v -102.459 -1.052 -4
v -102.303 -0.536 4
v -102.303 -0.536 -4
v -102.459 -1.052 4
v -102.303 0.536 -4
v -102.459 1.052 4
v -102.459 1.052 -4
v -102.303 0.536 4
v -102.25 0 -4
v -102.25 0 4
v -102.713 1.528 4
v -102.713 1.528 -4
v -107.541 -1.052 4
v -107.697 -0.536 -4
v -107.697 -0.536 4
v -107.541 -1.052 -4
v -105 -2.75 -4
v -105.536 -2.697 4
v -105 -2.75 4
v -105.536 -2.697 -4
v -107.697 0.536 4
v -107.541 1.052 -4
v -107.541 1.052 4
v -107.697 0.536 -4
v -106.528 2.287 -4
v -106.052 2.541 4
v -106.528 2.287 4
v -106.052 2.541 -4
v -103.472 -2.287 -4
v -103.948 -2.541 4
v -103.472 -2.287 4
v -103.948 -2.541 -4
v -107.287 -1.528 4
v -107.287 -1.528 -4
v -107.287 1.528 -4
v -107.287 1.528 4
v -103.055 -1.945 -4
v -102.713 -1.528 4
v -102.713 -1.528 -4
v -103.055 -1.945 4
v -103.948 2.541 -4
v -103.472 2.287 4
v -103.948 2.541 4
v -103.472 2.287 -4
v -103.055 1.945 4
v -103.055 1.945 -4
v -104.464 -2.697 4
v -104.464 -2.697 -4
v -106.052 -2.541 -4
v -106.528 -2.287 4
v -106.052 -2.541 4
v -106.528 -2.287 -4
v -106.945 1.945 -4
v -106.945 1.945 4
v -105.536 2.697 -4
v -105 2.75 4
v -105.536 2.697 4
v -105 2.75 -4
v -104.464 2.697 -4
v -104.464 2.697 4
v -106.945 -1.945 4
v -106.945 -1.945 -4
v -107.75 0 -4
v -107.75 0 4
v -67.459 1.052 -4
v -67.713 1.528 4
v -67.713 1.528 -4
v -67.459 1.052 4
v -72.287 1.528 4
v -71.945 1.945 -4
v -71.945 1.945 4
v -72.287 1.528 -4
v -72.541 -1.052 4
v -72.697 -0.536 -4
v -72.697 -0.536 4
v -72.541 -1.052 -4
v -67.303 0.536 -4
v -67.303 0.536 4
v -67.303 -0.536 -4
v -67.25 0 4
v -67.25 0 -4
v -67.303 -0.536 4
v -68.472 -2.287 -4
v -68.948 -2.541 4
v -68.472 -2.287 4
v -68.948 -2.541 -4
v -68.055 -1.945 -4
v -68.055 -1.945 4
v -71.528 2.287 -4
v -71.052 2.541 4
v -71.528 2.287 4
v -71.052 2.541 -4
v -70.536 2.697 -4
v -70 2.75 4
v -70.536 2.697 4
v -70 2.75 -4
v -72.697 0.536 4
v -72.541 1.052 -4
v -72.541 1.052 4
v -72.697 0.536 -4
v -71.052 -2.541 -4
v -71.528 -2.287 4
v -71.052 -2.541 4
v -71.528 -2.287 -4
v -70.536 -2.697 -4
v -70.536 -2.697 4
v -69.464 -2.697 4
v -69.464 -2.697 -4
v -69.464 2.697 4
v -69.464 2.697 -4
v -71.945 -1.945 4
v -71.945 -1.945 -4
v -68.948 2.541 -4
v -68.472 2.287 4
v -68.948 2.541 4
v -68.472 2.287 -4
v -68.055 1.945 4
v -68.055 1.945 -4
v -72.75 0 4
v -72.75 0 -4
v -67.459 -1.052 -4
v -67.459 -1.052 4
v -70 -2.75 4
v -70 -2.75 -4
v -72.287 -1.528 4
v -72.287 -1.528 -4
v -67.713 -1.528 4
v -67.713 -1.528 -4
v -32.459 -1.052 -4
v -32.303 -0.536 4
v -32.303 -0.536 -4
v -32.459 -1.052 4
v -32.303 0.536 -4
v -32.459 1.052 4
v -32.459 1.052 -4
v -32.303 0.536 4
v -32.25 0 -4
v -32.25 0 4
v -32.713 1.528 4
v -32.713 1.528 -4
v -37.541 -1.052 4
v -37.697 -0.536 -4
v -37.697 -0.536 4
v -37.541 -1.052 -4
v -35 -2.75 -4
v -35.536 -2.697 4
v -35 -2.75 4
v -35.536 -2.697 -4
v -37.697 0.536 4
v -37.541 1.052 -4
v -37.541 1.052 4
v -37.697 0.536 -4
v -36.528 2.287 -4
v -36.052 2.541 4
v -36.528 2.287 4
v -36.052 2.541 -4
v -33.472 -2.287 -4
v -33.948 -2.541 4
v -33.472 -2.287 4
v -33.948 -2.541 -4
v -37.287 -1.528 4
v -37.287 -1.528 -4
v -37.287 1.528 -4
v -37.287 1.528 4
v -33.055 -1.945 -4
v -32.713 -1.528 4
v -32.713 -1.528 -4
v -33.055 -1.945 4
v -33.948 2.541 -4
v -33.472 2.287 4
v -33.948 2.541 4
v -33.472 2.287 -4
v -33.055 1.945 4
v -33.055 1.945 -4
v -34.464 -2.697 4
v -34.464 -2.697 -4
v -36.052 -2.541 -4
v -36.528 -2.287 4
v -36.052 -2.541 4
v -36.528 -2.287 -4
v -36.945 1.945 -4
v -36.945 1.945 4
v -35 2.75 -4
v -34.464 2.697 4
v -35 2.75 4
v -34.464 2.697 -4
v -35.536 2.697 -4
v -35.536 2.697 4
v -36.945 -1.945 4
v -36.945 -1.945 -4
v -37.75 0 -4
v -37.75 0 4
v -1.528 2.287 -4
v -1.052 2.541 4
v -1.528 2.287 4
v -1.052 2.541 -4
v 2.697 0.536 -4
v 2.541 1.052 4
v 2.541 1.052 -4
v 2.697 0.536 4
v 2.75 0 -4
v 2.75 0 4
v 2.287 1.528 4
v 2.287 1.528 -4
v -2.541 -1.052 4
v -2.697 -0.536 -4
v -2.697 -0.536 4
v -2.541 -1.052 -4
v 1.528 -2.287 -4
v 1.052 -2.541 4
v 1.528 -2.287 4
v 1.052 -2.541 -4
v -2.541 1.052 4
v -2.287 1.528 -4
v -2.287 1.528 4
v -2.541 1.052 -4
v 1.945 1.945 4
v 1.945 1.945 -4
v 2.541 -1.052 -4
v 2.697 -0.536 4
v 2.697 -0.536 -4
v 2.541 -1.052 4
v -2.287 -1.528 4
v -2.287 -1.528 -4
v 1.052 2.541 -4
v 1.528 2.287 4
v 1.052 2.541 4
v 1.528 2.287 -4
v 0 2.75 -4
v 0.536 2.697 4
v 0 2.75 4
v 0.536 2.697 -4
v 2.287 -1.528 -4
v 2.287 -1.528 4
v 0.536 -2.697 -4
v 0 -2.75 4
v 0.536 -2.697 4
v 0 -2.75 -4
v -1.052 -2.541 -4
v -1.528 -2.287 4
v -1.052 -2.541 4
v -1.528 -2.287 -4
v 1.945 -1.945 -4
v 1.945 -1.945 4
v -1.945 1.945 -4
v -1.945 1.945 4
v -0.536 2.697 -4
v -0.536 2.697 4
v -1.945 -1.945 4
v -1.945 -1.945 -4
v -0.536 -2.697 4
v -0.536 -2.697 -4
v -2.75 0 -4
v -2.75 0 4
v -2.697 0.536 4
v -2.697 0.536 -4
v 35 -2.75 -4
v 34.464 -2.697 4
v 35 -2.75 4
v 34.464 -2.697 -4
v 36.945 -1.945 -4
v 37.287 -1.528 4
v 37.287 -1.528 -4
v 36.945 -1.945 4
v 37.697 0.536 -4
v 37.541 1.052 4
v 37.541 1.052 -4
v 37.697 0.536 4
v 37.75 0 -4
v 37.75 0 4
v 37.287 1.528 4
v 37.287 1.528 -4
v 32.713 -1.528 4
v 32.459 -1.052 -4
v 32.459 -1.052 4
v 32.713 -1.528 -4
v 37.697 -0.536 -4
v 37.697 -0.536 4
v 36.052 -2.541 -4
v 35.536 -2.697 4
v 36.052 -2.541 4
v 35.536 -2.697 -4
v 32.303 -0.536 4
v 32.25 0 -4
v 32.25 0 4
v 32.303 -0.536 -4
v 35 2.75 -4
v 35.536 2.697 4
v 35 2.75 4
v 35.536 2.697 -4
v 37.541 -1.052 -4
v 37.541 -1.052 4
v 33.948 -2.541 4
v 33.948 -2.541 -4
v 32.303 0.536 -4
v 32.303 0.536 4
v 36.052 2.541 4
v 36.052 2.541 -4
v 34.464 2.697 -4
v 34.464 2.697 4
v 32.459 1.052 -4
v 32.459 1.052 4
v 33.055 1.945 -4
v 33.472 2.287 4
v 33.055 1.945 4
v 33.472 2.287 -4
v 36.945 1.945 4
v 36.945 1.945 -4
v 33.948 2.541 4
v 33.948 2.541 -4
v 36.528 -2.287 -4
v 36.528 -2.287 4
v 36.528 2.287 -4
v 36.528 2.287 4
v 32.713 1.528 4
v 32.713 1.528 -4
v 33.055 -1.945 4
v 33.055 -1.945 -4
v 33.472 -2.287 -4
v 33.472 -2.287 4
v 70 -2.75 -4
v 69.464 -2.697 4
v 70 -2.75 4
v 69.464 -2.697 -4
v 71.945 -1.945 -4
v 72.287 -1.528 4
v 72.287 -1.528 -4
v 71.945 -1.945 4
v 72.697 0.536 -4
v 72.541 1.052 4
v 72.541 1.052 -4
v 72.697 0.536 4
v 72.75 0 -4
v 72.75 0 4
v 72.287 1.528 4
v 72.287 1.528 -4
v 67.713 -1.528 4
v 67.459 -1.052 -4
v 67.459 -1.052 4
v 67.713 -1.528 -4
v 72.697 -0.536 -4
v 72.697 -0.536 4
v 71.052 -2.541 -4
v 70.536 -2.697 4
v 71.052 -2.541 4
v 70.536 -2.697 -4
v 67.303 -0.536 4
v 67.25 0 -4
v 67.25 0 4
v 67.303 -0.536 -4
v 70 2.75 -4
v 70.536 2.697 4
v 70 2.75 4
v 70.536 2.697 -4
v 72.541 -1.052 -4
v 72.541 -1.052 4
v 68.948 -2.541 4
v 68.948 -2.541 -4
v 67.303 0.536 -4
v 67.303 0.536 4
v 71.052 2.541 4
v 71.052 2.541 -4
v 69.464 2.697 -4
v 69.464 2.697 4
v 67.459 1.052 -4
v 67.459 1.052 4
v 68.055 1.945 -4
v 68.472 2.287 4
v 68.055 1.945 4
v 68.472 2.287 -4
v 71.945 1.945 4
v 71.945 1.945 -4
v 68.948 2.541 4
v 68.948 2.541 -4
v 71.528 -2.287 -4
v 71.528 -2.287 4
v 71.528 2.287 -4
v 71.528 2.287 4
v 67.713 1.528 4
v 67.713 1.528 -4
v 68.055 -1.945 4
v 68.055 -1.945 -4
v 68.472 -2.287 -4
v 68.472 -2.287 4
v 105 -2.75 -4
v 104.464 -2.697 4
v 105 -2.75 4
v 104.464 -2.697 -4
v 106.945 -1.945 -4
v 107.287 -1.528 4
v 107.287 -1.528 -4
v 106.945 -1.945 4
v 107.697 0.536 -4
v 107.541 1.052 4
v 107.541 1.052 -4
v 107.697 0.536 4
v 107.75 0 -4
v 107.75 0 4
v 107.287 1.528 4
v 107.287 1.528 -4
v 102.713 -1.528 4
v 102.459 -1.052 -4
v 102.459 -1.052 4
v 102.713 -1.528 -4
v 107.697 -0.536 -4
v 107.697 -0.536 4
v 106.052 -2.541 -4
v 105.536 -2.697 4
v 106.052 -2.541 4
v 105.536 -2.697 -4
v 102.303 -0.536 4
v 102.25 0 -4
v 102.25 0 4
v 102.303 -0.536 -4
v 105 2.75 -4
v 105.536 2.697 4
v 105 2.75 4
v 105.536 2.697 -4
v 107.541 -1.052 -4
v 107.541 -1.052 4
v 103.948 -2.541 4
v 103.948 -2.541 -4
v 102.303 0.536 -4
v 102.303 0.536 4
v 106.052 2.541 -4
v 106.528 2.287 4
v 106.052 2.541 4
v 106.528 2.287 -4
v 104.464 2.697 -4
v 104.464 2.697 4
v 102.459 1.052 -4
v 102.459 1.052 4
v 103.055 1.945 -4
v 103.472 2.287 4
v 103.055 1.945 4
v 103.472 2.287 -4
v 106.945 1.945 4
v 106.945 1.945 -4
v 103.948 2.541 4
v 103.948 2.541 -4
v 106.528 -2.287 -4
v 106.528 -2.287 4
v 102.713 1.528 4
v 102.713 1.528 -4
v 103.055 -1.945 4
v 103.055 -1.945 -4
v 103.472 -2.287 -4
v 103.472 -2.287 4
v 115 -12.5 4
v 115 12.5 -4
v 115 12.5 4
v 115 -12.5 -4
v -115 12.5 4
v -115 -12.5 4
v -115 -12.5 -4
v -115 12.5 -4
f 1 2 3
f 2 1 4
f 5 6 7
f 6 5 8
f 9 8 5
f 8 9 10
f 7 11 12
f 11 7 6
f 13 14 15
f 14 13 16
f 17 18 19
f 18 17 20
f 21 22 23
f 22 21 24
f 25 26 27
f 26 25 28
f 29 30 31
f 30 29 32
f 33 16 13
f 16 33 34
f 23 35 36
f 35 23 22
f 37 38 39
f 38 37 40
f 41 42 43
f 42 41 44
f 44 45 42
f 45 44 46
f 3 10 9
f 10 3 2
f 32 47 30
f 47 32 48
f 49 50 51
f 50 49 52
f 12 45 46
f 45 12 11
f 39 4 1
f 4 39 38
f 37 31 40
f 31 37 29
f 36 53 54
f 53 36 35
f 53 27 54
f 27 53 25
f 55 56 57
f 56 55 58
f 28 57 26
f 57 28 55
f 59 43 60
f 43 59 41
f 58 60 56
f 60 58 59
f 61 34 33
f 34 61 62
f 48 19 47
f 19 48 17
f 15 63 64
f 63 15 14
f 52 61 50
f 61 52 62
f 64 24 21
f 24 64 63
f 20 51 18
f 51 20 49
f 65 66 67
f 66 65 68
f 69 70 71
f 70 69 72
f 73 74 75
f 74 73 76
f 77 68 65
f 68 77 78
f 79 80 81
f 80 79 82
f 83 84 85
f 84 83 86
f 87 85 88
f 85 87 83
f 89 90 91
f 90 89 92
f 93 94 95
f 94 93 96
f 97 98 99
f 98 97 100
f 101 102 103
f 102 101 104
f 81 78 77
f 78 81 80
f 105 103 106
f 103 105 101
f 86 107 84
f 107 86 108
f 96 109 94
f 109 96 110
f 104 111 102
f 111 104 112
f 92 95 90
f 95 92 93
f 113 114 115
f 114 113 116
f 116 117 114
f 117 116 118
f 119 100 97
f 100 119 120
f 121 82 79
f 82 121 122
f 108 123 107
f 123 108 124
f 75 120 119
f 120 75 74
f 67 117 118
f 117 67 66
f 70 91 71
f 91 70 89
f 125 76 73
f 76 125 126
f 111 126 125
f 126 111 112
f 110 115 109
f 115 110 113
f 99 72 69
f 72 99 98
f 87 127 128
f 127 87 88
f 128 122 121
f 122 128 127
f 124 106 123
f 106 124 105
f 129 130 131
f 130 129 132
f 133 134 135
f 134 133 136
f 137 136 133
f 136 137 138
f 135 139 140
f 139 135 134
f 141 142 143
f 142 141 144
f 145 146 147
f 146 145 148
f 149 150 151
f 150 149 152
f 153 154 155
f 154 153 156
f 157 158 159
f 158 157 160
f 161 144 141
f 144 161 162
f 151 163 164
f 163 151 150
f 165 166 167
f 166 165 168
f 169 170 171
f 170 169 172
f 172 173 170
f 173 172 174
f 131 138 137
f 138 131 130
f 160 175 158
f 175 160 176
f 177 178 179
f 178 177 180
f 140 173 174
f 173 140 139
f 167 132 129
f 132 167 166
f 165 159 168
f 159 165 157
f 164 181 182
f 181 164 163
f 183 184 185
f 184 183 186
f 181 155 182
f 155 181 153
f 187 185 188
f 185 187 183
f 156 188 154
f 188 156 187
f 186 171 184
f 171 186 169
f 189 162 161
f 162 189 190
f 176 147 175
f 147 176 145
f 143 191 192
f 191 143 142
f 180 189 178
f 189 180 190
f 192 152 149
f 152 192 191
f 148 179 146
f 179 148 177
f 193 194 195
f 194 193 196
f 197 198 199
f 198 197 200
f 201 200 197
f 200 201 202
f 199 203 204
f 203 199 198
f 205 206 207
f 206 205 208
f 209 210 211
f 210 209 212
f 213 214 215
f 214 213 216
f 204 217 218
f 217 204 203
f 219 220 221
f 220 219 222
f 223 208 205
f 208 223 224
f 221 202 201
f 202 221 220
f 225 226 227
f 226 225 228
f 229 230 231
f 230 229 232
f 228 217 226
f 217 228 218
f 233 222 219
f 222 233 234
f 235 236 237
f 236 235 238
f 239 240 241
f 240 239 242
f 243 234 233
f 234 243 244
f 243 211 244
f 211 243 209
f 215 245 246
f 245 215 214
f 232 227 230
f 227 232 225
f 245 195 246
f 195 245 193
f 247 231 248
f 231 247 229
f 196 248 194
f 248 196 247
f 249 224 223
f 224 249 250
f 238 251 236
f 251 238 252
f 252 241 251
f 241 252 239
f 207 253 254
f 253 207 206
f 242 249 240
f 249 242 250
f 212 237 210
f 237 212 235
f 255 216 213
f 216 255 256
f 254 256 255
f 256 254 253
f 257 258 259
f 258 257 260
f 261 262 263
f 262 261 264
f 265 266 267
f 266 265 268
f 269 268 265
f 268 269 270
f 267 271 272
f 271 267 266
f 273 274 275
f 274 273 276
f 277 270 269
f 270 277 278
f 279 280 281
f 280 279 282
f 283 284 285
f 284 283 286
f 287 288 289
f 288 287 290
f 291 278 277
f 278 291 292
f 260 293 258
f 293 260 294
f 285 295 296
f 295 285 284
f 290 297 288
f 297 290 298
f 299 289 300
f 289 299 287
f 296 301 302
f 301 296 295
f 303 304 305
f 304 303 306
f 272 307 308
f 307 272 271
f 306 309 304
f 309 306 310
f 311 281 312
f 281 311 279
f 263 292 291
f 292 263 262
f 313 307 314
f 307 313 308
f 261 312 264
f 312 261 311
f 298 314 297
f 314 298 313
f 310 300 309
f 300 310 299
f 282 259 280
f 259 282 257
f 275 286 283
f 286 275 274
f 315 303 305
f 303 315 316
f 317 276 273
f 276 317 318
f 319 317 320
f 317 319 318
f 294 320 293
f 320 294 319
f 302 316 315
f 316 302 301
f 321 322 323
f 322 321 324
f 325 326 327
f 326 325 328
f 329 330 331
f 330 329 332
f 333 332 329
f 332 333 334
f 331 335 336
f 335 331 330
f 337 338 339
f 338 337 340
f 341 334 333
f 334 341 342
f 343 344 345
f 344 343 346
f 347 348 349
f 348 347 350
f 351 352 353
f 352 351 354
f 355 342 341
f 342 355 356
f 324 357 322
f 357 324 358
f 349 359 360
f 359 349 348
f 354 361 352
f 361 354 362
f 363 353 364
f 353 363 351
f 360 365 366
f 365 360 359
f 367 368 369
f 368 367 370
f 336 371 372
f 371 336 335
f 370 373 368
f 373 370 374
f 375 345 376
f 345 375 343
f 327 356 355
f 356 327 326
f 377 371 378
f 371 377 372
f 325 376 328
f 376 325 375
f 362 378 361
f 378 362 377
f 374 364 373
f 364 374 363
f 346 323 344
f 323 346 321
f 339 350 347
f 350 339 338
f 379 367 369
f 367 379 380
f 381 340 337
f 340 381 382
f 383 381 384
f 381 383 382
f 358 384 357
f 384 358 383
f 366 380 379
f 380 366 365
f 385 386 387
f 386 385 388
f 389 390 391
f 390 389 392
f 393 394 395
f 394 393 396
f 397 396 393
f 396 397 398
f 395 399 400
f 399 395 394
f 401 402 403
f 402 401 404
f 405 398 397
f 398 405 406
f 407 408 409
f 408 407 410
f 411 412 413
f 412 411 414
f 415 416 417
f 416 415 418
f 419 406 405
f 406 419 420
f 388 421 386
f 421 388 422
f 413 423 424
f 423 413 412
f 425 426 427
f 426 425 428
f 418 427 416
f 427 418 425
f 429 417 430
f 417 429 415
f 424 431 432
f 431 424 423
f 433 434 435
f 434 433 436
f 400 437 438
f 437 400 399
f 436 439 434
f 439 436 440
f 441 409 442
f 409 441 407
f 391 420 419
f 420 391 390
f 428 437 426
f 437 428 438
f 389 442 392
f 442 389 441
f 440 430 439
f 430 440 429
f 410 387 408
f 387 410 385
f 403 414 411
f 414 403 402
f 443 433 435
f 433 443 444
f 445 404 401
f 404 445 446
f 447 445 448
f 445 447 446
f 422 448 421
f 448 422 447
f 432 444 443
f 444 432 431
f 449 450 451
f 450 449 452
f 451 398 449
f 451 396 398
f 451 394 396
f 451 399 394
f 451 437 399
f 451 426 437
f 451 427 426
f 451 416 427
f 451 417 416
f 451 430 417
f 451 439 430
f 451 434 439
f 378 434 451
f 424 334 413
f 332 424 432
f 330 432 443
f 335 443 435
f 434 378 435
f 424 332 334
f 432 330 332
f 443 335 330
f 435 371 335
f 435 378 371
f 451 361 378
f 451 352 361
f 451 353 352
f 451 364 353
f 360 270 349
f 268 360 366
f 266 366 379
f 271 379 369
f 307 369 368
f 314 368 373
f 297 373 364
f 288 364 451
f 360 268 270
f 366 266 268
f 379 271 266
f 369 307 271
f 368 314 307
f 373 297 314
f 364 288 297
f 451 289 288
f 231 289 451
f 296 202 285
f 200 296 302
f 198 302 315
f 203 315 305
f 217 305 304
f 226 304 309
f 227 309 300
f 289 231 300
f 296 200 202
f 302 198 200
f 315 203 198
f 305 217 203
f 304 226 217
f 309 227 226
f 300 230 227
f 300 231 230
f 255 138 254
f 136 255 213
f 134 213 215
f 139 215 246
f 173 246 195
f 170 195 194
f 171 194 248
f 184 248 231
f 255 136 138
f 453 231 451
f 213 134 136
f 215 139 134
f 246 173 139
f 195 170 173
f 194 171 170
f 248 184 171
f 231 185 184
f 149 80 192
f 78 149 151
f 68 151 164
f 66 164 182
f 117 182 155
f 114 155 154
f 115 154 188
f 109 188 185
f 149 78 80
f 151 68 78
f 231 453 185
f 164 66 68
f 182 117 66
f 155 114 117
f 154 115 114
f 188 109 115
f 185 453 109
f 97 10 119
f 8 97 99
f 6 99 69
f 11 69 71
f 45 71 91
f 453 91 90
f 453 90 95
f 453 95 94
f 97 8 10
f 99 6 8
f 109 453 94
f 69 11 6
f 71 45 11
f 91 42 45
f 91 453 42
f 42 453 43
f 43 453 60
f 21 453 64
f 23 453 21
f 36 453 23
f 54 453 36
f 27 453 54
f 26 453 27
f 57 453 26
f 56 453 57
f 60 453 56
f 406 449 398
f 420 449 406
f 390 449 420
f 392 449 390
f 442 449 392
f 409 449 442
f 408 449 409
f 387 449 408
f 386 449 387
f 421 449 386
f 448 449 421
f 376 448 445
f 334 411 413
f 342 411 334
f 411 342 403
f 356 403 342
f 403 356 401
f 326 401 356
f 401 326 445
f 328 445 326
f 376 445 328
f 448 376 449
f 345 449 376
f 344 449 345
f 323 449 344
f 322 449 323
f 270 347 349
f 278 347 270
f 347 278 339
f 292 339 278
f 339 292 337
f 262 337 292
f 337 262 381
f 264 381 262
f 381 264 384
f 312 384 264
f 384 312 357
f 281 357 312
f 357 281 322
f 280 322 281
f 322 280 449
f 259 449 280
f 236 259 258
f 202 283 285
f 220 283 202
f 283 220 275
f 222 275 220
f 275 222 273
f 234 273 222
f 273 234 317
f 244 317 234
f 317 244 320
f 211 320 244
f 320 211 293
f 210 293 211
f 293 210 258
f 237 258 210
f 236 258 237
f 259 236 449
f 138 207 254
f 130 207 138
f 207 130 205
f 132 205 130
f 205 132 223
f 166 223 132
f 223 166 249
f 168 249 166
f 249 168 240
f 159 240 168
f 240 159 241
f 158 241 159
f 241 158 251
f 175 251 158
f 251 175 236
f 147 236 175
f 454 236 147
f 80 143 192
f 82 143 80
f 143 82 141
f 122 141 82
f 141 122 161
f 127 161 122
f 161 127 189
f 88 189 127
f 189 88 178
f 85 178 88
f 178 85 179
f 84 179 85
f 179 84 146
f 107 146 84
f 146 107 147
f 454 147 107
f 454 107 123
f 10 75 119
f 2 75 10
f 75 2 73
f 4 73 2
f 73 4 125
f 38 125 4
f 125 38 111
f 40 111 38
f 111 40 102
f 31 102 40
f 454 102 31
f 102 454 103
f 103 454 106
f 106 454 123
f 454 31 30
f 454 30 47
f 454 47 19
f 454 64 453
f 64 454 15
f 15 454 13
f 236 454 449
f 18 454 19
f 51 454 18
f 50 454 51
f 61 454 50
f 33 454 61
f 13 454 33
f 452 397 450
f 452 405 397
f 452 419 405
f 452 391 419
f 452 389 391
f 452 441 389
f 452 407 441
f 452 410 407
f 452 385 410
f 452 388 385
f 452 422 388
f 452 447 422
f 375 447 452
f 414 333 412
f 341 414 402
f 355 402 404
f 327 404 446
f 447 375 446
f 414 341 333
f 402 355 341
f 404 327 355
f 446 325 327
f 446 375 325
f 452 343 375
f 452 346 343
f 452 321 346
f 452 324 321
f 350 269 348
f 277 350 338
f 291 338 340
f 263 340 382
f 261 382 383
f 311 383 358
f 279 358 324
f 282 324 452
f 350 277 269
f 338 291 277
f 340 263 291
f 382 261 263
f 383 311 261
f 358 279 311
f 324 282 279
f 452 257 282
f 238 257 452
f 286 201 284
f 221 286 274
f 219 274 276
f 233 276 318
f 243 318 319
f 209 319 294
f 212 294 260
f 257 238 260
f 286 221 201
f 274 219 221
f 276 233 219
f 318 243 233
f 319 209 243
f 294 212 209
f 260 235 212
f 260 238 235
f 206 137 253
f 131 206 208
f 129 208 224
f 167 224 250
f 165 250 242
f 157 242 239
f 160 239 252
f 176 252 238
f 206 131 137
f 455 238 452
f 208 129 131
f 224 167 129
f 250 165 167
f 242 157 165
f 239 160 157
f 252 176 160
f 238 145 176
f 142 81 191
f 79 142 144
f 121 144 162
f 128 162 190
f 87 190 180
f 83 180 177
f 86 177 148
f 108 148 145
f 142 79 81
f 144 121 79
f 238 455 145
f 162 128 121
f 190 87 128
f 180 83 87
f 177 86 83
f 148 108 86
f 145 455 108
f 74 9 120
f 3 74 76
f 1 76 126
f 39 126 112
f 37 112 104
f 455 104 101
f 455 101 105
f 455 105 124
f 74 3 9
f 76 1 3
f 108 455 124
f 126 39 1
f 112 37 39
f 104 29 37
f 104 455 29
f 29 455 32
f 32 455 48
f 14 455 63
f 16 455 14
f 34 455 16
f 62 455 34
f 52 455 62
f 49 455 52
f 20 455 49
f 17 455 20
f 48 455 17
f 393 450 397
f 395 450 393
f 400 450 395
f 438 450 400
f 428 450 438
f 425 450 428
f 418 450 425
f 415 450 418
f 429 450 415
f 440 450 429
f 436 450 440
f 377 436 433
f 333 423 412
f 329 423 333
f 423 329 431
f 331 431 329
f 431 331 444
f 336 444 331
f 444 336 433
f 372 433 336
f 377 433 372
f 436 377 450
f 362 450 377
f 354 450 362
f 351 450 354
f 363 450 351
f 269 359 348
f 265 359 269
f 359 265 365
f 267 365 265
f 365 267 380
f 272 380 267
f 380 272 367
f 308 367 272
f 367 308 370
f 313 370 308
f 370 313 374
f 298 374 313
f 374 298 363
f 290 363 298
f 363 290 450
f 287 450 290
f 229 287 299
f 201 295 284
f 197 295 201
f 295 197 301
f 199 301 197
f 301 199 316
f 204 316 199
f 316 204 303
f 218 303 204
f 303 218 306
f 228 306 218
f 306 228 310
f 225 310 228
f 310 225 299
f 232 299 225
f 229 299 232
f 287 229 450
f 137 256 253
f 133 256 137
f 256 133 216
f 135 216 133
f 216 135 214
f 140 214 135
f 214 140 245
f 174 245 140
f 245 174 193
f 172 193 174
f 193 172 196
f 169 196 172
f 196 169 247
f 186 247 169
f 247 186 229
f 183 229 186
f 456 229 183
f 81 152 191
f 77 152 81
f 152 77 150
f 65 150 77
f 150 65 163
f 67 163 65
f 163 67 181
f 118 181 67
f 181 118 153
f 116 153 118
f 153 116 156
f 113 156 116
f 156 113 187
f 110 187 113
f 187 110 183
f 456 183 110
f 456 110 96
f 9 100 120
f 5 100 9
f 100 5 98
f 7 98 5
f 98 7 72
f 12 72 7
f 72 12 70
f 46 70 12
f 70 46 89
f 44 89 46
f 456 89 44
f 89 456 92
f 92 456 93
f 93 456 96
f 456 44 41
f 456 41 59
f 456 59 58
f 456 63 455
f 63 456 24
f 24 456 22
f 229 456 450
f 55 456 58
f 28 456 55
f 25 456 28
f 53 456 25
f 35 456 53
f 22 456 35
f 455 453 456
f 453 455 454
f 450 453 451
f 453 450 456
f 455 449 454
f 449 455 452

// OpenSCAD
$fn = 32;

// ----------------------------------------------------------------------
// Hole bar, 7 x Ø5.5
// skip layout, 10 mm edge offset
// ----------------------------------------------------------------------

// --- parameters (mm) ---
bar_w = 25;         // bar width (Y)
bar_t = 8;          // bar thickness (Z)
holes = 7;          // holes per row
hole_d = 5.5;       // hole diameter
edge = 10;          // offset from the bar end to the first hole
grid_pitch = 17.5;  // grid the bar was laid out on

// --- derived feature positions (mm) ---
pitch = grid_pitch * 2;       // = 35   holes sit every other grid slot
span = (holes - 1) * pitch;   // = 210   distance between the end holes
bar_l = span + 2 * edge;      // = 230   overall bar length
start_x = -bar_l / 2 + edge;  // = -105   X of the first hole
feature_centers = [
  [start_x + 0 * pitch, 0],
  [start_x + 1 * pitch, 0],
  [start_x + 2 * pitch, 0],
  [start_x + 3 * pitch, 0],
  [start_x + 4 * pitch, 0],
  [start_x + 5 * pitch, 0],
  [start_x + 6 * pitch, 0]
];   // hole centres of the first row

// bar with one row of holes, drilled from feature_centers
difference() {
  translate([-bar_l / 2, -bar_w / 2, -bar_t / 2]) cube([bar_l, bar_w, bar_t]);
  for (centre = feature_centers)
    translate([centre[0], centre[1], 0])
      cylinder(d = hole_d, h = bar_t + 2, center = true);
}
